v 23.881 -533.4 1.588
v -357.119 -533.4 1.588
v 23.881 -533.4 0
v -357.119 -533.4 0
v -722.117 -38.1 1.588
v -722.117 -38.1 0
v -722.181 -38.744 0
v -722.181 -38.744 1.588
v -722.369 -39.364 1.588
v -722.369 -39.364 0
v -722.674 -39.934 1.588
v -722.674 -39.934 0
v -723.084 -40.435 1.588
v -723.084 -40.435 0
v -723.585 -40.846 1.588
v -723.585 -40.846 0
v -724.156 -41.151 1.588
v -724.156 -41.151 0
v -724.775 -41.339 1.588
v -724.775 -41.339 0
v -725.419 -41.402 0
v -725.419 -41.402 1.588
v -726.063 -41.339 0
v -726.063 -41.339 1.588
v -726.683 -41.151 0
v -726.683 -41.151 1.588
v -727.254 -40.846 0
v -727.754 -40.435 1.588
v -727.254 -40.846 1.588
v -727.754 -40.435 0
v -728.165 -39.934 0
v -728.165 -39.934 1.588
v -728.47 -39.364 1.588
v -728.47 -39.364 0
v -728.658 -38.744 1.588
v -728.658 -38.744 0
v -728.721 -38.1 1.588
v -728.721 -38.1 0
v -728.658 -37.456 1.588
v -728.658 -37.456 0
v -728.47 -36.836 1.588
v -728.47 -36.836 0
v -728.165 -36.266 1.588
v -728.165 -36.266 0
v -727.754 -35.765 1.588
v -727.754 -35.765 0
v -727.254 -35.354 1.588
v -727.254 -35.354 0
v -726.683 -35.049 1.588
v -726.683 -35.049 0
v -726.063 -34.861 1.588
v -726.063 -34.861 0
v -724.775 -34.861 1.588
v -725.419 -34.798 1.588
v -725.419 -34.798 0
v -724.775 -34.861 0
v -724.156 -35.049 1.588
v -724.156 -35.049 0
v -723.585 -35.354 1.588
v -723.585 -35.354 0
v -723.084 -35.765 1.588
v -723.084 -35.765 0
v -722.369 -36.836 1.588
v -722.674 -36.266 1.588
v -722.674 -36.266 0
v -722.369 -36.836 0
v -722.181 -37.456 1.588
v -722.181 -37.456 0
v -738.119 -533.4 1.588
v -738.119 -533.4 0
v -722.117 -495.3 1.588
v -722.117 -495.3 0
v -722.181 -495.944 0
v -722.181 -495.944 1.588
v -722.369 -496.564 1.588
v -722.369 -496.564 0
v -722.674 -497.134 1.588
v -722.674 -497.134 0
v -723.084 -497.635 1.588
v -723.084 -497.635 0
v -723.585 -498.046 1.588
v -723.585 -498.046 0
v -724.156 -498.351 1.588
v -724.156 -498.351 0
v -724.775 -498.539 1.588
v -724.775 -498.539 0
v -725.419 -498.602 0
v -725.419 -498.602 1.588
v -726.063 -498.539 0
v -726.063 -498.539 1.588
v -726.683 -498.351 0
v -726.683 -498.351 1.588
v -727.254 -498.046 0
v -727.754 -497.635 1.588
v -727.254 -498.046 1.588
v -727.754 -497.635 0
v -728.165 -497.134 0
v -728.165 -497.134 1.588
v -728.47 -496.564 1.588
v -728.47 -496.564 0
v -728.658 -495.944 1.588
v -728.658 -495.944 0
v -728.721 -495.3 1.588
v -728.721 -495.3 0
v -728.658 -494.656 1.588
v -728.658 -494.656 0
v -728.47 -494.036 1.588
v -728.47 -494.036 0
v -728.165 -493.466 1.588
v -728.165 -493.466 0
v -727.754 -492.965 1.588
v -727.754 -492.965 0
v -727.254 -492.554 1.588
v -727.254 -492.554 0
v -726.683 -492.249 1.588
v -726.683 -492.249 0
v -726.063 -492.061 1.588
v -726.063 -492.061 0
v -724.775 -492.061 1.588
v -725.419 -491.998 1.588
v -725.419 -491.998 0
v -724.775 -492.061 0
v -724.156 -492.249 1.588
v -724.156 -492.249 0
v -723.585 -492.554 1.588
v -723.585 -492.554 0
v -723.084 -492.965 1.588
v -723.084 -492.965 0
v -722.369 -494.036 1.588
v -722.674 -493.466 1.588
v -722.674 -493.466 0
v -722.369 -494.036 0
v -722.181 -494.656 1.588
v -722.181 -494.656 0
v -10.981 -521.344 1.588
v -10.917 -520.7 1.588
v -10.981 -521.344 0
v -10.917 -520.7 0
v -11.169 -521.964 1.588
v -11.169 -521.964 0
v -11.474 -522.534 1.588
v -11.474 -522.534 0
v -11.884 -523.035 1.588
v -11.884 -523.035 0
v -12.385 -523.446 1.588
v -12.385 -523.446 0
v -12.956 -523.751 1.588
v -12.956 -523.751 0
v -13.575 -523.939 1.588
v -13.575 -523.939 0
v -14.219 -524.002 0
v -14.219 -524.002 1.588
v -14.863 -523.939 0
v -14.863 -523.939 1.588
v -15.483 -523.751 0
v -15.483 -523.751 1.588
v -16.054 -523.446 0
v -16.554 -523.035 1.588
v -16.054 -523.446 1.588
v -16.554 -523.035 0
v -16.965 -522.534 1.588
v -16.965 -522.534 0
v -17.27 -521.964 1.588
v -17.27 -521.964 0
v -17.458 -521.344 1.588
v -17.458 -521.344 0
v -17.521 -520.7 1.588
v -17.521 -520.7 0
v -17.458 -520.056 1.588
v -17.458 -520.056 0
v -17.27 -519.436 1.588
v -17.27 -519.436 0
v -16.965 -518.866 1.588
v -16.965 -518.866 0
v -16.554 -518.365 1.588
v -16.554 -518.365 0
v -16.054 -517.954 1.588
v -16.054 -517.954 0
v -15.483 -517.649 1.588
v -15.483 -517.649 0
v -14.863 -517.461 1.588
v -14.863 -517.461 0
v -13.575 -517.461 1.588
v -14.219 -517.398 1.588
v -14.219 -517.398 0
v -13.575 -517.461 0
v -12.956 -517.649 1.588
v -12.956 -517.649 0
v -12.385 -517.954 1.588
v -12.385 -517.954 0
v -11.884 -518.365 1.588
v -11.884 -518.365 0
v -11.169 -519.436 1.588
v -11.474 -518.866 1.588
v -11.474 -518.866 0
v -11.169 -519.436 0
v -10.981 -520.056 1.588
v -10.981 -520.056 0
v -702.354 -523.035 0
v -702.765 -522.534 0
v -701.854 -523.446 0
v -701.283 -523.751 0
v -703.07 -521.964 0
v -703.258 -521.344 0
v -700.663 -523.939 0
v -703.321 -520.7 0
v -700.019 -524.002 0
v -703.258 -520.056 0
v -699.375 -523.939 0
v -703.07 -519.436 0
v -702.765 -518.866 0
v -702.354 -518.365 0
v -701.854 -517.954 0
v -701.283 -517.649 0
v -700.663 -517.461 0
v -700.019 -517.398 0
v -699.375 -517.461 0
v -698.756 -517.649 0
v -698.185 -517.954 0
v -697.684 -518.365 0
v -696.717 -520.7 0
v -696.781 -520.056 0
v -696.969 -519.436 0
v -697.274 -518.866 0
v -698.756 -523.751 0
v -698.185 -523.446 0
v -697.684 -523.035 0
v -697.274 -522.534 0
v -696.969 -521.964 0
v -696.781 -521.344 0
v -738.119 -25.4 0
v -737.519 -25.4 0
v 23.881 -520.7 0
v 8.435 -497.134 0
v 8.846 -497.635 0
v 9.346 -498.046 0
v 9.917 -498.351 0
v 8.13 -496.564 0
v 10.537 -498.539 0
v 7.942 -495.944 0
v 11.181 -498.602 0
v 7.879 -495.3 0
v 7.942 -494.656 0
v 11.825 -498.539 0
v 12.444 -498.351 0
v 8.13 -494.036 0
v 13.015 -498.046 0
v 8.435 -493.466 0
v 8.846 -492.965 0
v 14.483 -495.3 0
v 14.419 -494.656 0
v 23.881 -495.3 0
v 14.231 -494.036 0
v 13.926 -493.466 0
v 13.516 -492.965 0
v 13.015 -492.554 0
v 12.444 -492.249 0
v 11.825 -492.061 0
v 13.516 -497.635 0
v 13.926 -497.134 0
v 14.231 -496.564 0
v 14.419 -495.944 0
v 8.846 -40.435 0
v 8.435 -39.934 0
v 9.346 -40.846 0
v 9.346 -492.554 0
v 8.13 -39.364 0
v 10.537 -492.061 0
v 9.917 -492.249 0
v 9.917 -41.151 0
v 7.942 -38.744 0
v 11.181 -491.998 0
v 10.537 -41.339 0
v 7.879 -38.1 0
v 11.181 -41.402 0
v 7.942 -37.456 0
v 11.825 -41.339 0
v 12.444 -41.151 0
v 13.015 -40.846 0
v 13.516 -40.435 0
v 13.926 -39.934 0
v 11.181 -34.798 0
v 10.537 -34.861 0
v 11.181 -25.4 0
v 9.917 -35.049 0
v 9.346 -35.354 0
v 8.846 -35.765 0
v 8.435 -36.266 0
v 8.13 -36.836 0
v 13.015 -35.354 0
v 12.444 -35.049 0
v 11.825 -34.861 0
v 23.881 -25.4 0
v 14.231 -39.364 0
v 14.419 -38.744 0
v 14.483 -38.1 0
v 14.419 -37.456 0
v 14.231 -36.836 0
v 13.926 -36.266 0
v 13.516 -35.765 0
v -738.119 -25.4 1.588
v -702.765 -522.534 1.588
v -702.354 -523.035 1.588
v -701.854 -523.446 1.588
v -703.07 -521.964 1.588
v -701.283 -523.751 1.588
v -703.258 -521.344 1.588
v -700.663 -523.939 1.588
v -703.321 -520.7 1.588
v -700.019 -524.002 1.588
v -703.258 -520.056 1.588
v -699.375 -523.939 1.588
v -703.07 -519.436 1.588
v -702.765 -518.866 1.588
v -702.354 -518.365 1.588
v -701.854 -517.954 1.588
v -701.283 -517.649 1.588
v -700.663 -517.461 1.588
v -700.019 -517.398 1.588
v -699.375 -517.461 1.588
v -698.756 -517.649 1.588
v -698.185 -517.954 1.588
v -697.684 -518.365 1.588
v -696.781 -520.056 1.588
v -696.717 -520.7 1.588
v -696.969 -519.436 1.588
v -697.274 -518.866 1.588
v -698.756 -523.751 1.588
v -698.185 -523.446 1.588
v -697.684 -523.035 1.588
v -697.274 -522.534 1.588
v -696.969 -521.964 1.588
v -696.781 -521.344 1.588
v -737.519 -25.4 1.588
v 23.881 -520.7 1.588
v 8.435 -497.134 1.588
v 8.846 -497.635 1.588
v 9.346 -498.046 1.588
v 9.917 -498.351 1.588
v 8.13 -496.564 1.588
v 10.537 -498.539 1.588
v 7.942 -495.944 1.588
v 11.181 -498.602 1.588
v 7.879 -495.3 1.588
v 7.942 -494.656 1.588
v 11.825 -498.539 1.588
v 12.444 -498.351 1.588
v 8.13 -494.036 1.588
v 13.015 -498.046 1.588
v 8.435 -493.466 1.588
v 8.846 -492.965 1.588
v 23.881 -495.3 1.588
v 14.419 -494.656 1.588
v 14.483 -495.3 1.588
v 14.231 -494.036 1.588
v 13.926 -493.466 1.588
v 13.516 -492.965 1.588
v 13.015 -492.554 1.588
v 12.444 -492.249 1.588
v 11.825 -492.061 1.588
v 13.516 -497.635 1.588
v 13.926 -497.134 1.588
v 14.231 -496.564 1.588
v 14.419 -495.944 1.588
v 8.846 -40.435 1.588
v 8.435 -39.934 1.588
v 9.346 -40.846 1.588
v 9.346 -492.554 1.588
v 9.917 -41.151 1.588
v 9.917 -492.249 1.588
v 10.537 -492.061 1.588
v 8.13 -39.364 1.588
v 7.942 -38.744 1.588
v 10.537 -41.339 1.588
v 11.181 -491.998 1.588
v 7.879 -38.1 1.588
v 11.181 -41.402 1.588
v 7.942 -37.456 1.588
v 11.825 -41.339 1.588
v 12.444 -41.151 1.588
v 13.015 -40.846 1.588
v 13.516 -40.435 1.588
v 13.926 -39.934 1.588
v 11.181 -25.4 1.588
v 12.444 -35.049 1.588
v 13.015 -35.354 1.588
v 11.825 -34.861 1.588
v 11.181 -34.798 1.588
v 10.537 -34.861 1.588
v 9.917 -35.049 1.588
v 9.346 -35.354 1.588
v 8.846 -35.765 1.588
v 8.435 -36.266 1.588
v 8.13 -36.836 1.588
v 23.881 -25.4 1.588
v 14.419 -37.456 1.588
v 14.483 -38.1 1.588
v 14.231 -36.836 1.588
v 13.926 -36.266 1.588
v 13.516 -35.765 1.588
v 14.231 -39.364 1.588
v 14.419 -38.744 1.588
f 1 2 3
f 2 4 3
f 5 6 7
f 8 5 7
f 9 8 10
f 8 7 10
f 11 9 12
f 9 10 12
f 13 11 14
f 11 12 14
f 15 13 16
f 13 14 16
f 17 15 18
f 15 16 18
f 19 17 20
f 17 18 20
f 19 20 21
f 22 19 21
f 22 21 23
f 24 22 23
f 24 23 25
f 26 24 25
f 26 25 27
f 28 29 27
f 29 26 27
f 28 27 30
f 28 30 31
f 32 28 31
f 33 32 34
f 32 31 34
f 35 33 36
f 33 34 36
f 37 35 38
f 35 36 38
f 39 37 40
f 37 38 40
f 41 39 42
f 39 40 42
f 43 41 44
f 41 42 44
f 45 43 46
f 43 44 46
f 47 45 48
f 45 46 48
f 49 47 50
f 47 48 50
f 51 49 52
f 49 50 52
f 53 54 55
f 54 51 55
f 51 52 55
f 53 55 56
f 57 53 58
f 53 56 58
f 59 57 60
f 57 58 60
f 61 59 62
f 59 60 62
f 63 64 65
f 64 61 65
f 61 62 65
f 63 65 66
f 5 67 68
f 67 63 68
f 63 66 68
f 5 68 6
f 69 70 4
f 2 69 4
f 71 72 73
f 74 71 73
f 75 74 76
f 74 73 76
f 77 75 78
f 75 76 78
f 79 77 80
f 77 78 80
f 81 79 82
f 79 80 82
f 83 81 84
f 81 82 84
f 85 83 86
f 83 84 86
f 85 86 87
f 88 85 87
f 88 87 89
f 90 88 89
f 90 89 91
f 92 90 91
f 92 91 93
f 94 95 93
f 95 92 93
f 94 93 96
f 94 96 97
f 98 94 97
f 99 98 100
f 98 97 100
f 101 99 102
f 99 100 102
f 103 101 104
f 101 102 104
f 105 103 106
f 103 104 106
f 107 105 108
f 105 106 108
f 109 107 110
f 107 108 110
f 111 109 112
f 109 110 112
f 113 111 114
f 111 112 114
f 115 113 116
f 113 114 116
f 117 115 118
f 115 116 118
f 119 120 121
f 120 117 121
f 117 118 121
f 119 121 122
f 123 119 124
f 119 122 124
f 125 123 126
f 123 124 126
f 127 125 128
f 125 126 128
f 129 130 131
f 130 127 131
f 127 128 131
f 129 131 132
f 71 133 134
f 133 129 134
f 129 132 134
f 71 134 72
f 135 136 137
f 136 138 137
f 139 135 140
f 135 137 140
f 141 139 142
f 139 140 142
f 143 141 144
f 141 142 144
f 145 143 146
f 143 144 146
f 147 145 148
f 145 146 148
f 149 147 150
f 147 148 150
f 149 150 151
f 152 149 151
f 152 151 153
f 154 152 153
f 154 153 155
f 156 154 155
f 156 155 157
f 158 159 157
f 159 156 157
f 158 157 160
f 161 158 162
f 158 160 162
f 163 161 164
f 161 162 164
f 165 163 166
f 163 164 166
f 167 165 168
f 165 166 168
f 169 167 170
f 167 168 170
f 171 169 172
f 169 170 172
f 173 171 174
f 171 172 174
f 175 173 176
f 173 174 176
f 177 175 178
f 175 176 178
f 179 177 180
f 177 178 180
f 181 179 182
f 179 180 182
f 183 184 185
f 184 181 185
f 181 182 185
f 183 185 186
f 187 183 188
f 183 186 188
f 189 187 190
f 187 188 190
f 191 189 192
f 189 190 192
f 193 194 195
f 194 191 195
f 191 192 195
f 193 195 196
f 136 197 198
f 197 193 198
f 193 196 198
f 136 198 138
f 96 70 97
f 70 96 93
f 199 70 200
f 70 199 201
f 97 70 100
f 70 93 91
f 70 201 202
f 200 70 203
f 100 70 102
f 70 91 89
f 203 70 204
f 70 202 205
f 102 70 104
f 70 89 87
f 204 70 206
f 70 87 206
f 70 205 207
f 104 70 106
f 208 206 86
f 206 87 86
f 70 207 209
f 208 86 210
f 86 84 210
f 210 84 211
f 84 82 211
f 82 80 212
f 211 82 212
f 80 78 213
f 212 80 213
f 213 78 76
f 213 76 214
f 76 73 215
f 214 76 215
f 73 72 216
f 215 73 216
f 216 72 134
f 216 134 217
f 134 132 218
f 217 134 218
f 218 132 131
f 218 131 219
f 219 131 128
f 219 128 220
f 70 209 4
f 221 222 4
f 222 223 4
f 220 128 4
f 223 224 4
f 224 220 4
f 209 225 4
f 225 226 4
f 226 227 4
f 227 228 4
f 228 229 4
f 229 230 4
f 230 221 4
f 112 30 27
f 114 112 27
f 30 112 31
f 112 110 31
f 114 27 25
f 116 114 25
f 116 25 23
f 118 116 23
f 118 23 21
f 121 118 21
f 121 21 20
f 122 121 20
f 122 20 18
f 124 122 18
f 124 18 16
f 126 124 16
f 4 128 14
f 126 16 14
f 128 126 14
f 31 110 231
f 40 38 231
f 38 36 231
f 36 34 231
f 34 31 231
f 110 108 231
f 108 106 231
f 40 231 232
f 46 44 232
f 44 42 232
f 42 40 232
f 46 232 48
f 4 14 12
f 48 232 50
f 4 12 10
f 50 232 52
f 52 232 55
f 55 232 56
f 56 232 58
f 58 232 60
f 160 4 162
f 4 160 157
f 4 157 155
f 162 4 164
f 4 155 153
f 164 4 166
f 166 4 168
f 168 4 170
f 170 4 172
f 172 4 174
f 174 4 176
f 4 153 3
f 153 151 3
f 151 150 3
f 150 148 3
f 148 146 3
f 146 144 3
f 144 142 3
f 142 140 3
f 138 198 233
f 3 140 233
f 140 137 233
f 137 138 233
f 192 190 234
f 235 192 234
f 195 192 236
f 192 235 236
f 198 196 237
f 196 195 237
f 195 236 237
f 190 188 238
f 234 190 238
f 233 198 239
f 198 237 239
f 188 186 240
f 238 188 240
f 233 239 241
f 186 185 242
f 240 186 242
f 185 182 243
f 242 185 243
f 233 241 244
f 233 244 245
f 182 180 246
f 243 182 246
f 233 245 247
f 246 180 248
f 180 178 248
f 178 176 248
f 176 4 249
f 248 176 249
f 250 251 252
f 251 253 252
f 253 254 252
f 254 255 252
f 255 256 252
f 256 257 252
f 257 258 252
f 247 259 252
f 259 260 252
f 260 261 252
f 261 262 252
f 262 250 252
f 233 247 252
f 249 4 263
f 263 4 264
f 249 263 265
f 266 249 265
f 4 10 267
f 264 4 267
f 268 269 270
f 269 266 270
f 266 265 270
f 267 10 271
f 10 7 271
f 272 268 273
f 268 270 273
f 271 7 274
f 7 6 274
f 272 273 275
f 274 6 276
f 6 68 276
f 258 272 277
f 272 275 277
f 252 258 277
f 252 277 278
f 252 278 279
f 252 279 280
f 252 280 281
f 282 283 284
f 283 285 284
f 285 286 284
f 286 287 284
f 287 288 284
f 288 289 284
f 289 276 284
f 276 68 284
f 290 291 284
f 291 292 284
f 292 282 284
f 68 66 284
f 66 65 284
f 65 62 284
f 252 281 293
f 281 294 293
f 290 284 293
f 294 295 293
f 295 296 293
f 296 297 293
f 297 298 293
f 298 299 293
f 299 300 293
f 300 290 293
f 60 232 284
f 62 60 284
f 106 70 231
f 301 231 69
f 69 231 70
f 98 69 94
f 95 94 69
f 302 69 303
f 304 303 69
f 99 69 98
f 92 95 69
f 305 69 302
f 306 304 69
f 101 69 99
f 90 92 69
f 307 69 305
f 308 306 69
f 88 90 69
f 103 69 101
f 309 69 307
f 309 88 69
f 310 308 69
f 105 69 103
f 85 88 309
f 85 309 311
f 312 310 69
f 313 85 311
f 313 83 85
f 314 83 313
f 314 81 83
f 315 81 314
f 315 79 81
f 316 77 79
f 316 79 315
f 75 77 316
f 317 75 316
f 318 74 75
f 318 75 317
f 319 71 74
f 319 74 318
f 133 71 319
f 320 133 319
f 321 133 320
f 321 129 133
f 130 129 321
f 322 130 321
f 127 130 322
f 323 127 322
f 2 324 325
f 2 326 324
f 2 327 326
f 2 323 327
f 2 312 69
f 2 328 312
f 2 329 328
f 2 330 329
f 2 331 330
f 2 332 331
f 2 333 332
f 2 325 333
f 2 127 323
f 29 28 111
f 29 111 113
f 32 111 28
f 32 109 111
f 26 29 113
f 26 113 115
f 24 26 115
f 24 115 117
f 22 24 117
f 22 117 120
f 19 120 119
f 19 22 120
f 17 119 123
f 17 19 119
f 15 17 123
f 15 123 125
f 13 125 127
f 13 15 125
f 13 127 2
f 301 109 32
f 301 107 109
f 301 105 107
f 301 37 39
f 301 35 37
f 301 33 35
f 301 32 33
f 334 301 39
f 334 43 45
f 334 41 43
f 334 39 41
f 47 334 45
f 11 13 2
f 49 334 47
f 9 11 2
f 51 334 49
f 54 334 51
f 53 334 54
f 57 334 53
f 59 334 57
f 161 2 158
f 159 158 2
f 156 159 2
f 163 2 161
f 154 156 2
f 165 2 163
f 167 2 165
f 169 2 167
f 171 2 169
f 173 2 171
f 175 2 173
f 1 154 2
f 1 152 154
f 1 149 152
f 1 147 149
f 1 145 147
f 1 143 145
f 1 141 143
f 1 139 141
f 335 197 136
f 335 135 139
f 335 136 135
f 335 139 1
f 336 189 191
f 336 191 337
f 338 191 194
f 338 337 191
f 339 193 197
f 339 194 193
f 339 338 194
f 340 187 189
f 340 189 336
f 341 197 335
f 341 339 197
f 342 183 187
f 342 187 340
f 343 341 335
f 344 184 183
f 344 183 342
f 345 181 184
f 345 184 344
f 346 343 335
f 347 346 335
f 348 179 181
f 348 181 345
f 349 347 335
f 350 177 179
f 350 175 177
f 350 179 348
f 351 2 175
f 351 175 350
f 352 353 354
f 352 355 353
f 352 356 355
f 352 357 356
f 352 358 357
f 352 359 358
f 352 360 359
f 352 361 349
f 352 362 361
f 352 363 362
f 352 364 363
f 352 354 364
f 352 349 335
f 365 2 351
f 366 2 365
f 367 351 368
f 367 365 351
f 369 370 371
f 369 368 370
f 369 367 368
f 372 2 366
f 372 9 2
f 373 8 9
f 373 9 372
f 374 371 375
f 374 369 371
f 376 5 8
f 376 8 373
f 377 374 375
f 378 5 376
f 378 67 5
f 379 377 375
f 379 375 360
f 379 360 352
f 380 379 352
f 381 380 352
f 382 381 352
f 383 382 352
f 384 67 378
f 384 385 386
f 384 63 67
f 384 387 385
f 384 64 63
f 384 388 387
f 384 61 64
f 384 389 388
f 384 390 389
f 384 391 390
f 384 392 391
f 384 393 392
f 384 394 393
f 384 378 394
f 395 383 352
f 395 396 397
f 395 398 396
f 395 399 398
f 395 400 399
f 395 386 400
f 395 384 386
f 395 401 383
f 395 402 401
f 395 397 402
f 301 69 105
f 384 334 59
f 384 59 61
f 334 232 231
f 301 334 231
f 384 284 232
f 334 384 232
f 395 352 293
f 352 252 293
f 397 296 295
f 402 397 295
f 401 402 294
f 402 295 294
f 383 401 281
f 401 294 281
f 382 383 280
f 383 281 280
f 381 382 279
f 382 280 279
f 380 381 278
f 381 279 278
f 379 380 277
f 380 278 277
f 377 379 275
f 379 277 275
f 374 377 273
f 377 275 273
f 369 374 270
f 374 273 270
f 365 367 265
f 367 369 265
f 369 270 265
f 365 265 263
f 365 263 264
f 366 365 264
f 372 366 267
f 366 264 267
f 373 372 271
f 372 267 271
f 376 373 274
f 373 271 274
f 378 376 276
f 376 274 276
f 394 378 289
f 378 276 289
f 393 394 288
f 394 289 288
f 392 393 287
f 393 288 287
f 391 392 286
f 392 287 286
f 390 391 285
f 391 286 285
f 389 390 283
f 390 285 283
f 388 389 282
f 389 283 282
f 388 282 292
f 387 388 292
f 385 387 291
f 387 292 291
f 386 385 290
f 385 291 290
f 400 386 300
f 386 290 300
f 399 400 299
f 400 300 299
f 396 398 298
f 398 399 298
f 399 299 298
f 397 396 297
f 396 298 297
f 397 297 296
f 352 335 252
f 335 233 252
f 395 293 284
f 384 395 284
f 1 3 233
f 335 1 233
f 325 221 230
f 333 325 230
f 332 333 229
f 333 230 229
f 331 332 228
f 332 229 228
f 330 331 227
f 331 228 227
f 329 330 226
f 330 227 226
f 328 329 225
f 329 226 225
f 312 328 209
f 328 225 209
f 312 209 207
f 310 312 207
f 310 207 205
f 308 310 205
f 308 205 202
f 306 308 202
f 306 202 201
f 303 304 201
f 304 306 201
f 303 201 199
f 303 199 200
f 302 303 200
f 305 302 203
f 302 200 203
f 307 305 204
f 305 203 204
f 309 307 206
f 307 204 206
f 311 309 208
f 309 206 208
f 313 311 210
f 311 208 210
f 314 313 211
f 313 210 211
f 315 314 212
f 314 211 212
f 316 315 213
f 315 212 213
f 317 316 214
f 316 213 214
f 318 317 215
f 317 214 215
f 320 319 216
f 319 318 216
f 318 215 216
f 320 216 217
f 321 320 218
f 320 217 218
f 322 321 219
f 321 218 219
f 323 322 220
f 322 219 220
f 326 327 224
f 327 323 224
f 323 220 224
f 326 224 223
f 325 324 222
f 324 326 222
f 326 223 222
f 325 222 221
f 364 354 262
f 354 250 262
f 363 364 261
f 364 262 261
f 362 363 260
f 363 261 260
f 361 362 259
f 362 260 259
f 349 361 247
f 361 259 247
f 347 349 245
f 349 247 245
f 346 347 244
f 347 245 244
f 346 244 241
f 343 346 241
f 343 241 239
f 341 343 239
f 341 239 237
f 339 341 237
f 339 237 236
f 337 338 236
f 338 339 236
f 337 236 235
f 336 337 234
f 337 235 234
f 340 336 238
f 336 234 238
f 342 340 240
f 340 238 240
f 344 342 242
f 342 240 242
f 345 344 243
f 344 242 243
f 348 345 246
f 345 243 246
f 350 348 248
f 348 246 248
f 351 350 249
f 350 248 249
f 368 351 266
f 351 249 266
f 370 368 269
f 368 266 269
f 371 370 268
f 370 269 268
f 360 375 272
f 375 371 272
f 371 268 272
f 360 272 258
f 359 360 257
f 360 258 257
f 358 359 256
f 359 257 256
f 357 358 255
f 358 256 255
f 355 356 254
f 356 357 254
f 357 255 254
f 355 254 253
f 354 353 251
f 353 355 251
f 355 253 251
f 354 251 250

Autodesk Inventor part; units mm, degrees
ref_plane "YZ Plane" through (0, 0, 0) normal (1, 0, 0) x (0, 1, 0)
ref_plane "XZ Plane" through (0, 0, 0) normal (0, 1, 0) x (-1, 0, 0)
ref_plane "XY Plane" through (0, 0, 0) normal (0, 0, 1) x (1, 0, 0)
ref_plane "Work Plane1" through (0, 0, 0) normal (0, 0, 1) x (1, 0, 0)
sketch "Sketch1" plane through (0, 0, 0) normal (0, 0, 1) x (1, 0, 0)
  line L0 (23.8808, -12.7) -> (23.8808, -25.4) projected
  line L1 (21.1808, -12.7) -> (23.8808, -12.7) projected
  line L2 (-728.3704, -532.9745) -> (-736.6, -532.9745) projected
  line L3 (-737.616, -531.9585) -> (-737.616, -523.7289) projected
  line L4 (-737.5192, -12.7) -> (-737.5192, -25.4) projected
  line L5 (-712.1334, -532.9746) -> (-0.9334, -532.9746) projected
  line L6 (23.8808, -25.4) -> (-738.1192, -25.4)
  line L7 (-738.1192, -25.4) -> (-738.1192, -533.4)
  line L8 (-738.1192, -533.4) -> (23.8808, -533.4)
  line L9 (23.8808, -533.4) -> (23.8808, -25.4)
  line L10 (23.8808, -25.4) -> (11.1808, -25.4)
  line L11 (11.1808, -25.4) -> (11.1808, -38.1)
  circle A0 centre (11.1808, -38.1) radius 3.302
  line L12 (23.8808, -533.4) -> (23.8808, -495.3)
  line L13 (23.8808, -495.3) -> (11.1808, -495.3)
  circle A1 centre (11.1808, -495.3) radius 3.302
  line L14 (23.8808, -533.4) -> (23.8808, -520.7)
  line L15 (23.8808, -520.7) -> (-14.2192, -520.7)
  circle A2 centre (-14.2192, -520.7) radius 3.302
  line L16 (23.8808, -533.4) -> (-357.1192, -533.4)
  line L17 (23.8808, -533.4) -> (404.8808, -533.4) construction
  line L18 (-357.1192, -533.4) -> (-357.1192, -428.4969)
  line L19 (-357.1192, -533.4) -> (-252.2161, -533.4) construction
  circle A3 centre (-725.4192, -38.1) radius 3.302
  circle A4 centre (-725.4192, -495.3) radius 3.302
  circle A5 centre (-700.0192, -520.7) radius 3.302
  point P0 (0, 0)
  dimension "d0" = 762
  dimension "d1" = 508
  dimension "d4" = 12.7
  dimension "d5" = 12.7
  dimension "d6" = 6.604
  dimension "d7" = 38.1
  dimension "d8" = 12.7
  dimension "d9" = 6.604
  dimension "d10" = 12.7
  dimension "d11" = 38.1
  dimension "d12" = 6.604
  dimension "d13" = 381
  dimension "d14" = 180
  dimension "d15" = 90
extrude "Extrusion2" add sketch "Sketch1" along normal blind 1.5875
properties part number "vrRig_enclosure_sidePanel"
